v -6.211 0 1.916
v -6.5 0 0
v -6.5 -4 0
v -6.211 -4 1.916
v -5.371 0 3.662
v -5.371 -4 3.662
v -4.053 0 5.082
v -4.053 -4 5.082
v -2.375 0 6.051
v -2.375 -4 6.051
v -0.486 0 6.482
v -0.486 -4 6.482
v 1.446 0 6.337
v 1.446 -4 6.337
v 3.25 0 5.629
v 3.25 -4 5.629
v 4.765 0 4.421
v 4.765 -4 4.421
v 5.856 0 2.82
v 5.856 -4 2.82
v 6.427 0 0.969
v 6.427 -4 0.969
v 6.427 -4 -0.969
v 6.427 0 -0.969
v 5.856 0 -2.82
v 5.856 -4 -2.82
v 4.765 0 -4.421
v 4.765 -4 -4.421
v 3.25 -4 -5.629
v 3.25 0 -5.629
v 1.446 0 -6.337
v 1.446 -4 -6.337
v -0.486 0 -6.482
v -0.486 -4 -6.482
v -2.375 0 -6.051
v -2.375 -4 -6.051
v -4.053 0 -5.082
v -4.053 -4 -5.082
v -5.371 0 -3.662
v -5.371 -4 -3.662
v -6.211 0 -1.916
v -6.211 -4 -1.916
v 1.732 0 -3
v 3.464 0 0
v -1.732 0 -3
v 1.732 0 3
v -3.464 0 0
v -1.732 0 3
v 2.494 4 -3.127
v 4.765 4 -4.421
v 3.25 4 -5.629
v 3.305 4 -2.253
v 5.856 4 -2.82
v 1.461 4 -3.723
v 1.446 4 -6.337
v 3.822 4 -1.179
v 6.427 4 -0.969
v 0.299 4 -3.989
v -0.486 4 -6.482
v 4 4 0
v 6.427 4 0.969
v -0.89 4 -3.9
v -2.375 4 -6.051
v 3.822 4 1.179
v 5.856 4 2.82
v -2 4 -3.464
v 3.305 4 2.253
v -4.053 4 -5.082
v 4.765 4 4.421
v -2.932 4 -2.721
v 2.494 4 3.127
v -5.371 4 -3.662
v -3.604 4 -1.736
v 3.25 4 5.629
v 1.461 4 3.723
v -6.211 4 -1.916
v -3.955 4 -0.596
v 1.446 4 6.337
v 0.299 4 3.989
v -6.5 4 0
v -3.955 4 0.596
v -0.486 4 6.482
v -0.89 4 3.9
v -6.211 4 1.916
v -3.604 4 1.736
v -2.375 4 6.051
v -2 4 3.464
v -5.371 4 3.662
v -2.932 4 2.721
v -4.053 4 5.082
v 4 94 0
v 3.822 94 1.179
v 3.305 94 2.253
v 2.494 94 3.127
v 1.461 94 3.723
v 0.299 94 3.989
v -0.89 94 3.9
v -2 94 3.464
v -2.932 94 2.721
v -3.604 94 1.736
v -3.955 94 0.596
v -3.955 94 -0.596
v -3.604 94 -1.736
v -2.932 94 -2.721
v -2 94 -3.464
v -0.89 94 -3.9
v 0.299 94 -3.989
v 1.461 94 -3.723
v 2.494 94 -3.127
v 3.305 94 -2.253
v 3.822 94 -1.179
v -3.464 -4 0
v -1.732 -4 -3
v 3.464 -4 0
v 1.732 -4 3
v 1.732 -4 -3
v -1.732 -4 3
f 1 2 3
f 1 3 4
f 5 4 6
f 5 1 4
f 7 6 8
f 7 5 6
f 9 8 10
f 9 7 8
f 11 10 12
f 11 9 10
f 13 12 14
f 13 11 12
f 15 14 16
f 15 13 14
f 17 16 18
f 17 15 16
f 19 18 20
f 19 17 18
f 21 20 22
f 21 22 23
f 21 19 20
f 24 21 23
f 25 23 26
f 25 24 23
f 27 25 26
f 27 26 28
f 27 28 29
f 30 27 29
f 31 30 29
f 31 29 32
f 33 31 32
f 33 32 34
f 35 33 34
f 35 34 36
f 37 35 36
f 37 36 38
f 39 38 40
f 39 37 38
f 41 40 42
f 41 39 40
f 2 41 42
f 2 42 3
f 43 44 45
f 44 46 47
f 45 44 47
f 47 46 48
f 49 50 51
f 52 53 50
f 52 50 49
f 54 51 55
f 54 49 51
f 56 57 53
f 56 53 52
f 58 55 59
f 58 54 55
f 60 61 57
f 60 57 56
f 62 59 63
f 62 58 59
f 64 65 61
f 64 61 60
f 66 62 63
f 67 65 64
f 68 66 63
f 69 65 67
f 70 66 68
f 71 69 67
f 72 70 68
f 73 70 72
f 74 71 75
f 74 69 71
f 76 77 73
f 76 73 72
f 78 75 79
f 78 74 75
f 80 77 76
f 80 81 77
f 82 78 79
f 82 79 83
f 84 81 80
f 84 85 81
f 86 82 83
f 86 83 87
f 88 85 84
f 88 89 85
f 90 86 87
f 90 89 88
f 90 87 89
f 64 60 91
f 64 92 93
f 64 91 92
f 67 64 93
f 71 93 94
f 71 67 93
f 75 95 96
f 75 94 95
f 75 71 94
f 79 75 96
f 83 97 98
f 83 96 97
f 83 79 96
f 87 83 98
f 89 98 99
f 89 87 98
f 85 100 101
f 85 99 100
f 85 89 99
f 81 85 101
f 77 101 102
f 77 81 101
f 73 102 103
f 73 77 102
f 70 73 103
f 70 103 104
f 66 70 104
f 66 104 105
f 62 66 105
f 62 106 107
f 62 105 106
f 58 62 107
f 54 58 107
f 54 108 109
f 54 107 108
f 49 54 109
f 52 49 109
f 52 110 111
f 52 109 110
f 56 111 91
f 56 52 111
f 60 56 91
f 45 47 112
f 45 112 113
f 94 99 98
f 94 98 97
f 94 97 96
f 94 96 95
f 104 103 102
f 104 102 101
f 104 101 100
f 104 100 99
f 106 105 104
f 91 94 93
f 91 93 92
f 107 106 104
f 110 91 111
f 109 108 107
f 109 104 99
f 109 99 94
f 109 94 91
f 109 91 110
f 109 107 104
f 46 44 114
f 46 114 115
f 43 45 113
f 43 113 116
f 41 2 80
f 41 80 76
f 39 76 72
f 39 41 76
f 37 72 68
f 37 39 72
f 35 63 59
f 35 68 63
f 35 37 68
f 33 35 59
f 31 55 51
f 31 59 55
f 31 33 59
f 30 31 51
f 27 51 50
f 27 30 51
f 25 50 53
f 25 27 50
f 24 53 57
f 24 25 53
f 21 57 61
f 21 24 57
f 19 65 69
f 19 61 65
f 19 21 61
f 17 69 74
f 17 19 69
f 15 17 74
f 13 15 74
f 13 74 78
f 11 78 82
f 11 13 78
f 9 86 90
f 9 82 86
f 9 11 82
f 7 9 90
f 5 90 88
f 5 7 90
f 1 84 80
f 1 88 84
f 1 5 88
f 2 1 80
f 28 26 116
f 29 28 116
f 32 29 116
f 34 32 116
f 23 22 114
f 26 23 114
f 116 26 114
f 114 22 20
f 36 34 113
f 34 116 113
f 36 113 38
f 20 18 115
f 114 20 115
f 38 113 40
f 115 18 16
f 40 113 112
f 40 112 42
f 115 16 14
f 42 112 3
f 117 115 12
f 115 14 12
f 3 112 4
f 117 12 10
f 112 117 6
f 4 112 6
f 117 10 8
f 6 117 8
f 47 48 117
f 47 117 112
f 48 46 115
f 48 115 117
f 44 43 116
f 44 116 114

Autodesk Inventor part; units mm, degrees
ref_plane "YZ Plane" through (0, 0, 0) normal (1, 0, 0) x (0, 1, 0)
ref_plane "XZ Plane" through (0, 0, 0) normal (0, 1, 0) x (-1, 0, 0)
ref_plane "XY Plane" through (0, 0, 0) normal (0, 0, 1) x (1, 0, 0)
sketch "Szkic1" plane through (0, 0, 0) normal (0, 1, 0) x (-1, 0, 0)
  circle A0 centre (0, 0) radius 6.5
  line L0 (1.7321, 3) -> (3.4641, 0)
  line L1 (3.4641, 0) -> (1.7321, -3)
  line L2 (1.7321, -3) -> (-1.7321, -3)
  line L3 (-1.7321, -3) -> (-3.4641, 0)
  line L4 (-3.4641, 0) -> (-1.7321, 3)
  line L5 (-1.7321, 3) -> (1.7321, 3)
  circle A1 centre (0, 0) radius 4
  dimension "d0" = 13
  dimension "d1" = 6
  dimension "d12" = 8
extrude "Wyciągnięcie proste1" add sketch "Szkic1" along normal blind 4 contours A0 | L0 L1 L2 L3 L4 L5 | A1
extrude "Wyciągnięcie proste2" add sketch "Szkic1" against normal blind 4 contours A0 | A1
sketch "Szkic2" plane through (0, 4, 0) normal (0, 1, 0) x (1, 0, 0)
  circle A0 centre (0, 0) radius 4
  dimension "d7" = 8
extrude "Wyciągnięcie proste3" add sketch "Szkic2" along normal blind 90
thread "Gwint1" size "M8x1.25" class "6g" standard "ANSI Metric M Profile" length 48 offset 35
thread "Gwint2" size "M8x1.25" class "6g" standard "ANSI Metric M Profile" length 28
properties part number "M8x80_threaded"
